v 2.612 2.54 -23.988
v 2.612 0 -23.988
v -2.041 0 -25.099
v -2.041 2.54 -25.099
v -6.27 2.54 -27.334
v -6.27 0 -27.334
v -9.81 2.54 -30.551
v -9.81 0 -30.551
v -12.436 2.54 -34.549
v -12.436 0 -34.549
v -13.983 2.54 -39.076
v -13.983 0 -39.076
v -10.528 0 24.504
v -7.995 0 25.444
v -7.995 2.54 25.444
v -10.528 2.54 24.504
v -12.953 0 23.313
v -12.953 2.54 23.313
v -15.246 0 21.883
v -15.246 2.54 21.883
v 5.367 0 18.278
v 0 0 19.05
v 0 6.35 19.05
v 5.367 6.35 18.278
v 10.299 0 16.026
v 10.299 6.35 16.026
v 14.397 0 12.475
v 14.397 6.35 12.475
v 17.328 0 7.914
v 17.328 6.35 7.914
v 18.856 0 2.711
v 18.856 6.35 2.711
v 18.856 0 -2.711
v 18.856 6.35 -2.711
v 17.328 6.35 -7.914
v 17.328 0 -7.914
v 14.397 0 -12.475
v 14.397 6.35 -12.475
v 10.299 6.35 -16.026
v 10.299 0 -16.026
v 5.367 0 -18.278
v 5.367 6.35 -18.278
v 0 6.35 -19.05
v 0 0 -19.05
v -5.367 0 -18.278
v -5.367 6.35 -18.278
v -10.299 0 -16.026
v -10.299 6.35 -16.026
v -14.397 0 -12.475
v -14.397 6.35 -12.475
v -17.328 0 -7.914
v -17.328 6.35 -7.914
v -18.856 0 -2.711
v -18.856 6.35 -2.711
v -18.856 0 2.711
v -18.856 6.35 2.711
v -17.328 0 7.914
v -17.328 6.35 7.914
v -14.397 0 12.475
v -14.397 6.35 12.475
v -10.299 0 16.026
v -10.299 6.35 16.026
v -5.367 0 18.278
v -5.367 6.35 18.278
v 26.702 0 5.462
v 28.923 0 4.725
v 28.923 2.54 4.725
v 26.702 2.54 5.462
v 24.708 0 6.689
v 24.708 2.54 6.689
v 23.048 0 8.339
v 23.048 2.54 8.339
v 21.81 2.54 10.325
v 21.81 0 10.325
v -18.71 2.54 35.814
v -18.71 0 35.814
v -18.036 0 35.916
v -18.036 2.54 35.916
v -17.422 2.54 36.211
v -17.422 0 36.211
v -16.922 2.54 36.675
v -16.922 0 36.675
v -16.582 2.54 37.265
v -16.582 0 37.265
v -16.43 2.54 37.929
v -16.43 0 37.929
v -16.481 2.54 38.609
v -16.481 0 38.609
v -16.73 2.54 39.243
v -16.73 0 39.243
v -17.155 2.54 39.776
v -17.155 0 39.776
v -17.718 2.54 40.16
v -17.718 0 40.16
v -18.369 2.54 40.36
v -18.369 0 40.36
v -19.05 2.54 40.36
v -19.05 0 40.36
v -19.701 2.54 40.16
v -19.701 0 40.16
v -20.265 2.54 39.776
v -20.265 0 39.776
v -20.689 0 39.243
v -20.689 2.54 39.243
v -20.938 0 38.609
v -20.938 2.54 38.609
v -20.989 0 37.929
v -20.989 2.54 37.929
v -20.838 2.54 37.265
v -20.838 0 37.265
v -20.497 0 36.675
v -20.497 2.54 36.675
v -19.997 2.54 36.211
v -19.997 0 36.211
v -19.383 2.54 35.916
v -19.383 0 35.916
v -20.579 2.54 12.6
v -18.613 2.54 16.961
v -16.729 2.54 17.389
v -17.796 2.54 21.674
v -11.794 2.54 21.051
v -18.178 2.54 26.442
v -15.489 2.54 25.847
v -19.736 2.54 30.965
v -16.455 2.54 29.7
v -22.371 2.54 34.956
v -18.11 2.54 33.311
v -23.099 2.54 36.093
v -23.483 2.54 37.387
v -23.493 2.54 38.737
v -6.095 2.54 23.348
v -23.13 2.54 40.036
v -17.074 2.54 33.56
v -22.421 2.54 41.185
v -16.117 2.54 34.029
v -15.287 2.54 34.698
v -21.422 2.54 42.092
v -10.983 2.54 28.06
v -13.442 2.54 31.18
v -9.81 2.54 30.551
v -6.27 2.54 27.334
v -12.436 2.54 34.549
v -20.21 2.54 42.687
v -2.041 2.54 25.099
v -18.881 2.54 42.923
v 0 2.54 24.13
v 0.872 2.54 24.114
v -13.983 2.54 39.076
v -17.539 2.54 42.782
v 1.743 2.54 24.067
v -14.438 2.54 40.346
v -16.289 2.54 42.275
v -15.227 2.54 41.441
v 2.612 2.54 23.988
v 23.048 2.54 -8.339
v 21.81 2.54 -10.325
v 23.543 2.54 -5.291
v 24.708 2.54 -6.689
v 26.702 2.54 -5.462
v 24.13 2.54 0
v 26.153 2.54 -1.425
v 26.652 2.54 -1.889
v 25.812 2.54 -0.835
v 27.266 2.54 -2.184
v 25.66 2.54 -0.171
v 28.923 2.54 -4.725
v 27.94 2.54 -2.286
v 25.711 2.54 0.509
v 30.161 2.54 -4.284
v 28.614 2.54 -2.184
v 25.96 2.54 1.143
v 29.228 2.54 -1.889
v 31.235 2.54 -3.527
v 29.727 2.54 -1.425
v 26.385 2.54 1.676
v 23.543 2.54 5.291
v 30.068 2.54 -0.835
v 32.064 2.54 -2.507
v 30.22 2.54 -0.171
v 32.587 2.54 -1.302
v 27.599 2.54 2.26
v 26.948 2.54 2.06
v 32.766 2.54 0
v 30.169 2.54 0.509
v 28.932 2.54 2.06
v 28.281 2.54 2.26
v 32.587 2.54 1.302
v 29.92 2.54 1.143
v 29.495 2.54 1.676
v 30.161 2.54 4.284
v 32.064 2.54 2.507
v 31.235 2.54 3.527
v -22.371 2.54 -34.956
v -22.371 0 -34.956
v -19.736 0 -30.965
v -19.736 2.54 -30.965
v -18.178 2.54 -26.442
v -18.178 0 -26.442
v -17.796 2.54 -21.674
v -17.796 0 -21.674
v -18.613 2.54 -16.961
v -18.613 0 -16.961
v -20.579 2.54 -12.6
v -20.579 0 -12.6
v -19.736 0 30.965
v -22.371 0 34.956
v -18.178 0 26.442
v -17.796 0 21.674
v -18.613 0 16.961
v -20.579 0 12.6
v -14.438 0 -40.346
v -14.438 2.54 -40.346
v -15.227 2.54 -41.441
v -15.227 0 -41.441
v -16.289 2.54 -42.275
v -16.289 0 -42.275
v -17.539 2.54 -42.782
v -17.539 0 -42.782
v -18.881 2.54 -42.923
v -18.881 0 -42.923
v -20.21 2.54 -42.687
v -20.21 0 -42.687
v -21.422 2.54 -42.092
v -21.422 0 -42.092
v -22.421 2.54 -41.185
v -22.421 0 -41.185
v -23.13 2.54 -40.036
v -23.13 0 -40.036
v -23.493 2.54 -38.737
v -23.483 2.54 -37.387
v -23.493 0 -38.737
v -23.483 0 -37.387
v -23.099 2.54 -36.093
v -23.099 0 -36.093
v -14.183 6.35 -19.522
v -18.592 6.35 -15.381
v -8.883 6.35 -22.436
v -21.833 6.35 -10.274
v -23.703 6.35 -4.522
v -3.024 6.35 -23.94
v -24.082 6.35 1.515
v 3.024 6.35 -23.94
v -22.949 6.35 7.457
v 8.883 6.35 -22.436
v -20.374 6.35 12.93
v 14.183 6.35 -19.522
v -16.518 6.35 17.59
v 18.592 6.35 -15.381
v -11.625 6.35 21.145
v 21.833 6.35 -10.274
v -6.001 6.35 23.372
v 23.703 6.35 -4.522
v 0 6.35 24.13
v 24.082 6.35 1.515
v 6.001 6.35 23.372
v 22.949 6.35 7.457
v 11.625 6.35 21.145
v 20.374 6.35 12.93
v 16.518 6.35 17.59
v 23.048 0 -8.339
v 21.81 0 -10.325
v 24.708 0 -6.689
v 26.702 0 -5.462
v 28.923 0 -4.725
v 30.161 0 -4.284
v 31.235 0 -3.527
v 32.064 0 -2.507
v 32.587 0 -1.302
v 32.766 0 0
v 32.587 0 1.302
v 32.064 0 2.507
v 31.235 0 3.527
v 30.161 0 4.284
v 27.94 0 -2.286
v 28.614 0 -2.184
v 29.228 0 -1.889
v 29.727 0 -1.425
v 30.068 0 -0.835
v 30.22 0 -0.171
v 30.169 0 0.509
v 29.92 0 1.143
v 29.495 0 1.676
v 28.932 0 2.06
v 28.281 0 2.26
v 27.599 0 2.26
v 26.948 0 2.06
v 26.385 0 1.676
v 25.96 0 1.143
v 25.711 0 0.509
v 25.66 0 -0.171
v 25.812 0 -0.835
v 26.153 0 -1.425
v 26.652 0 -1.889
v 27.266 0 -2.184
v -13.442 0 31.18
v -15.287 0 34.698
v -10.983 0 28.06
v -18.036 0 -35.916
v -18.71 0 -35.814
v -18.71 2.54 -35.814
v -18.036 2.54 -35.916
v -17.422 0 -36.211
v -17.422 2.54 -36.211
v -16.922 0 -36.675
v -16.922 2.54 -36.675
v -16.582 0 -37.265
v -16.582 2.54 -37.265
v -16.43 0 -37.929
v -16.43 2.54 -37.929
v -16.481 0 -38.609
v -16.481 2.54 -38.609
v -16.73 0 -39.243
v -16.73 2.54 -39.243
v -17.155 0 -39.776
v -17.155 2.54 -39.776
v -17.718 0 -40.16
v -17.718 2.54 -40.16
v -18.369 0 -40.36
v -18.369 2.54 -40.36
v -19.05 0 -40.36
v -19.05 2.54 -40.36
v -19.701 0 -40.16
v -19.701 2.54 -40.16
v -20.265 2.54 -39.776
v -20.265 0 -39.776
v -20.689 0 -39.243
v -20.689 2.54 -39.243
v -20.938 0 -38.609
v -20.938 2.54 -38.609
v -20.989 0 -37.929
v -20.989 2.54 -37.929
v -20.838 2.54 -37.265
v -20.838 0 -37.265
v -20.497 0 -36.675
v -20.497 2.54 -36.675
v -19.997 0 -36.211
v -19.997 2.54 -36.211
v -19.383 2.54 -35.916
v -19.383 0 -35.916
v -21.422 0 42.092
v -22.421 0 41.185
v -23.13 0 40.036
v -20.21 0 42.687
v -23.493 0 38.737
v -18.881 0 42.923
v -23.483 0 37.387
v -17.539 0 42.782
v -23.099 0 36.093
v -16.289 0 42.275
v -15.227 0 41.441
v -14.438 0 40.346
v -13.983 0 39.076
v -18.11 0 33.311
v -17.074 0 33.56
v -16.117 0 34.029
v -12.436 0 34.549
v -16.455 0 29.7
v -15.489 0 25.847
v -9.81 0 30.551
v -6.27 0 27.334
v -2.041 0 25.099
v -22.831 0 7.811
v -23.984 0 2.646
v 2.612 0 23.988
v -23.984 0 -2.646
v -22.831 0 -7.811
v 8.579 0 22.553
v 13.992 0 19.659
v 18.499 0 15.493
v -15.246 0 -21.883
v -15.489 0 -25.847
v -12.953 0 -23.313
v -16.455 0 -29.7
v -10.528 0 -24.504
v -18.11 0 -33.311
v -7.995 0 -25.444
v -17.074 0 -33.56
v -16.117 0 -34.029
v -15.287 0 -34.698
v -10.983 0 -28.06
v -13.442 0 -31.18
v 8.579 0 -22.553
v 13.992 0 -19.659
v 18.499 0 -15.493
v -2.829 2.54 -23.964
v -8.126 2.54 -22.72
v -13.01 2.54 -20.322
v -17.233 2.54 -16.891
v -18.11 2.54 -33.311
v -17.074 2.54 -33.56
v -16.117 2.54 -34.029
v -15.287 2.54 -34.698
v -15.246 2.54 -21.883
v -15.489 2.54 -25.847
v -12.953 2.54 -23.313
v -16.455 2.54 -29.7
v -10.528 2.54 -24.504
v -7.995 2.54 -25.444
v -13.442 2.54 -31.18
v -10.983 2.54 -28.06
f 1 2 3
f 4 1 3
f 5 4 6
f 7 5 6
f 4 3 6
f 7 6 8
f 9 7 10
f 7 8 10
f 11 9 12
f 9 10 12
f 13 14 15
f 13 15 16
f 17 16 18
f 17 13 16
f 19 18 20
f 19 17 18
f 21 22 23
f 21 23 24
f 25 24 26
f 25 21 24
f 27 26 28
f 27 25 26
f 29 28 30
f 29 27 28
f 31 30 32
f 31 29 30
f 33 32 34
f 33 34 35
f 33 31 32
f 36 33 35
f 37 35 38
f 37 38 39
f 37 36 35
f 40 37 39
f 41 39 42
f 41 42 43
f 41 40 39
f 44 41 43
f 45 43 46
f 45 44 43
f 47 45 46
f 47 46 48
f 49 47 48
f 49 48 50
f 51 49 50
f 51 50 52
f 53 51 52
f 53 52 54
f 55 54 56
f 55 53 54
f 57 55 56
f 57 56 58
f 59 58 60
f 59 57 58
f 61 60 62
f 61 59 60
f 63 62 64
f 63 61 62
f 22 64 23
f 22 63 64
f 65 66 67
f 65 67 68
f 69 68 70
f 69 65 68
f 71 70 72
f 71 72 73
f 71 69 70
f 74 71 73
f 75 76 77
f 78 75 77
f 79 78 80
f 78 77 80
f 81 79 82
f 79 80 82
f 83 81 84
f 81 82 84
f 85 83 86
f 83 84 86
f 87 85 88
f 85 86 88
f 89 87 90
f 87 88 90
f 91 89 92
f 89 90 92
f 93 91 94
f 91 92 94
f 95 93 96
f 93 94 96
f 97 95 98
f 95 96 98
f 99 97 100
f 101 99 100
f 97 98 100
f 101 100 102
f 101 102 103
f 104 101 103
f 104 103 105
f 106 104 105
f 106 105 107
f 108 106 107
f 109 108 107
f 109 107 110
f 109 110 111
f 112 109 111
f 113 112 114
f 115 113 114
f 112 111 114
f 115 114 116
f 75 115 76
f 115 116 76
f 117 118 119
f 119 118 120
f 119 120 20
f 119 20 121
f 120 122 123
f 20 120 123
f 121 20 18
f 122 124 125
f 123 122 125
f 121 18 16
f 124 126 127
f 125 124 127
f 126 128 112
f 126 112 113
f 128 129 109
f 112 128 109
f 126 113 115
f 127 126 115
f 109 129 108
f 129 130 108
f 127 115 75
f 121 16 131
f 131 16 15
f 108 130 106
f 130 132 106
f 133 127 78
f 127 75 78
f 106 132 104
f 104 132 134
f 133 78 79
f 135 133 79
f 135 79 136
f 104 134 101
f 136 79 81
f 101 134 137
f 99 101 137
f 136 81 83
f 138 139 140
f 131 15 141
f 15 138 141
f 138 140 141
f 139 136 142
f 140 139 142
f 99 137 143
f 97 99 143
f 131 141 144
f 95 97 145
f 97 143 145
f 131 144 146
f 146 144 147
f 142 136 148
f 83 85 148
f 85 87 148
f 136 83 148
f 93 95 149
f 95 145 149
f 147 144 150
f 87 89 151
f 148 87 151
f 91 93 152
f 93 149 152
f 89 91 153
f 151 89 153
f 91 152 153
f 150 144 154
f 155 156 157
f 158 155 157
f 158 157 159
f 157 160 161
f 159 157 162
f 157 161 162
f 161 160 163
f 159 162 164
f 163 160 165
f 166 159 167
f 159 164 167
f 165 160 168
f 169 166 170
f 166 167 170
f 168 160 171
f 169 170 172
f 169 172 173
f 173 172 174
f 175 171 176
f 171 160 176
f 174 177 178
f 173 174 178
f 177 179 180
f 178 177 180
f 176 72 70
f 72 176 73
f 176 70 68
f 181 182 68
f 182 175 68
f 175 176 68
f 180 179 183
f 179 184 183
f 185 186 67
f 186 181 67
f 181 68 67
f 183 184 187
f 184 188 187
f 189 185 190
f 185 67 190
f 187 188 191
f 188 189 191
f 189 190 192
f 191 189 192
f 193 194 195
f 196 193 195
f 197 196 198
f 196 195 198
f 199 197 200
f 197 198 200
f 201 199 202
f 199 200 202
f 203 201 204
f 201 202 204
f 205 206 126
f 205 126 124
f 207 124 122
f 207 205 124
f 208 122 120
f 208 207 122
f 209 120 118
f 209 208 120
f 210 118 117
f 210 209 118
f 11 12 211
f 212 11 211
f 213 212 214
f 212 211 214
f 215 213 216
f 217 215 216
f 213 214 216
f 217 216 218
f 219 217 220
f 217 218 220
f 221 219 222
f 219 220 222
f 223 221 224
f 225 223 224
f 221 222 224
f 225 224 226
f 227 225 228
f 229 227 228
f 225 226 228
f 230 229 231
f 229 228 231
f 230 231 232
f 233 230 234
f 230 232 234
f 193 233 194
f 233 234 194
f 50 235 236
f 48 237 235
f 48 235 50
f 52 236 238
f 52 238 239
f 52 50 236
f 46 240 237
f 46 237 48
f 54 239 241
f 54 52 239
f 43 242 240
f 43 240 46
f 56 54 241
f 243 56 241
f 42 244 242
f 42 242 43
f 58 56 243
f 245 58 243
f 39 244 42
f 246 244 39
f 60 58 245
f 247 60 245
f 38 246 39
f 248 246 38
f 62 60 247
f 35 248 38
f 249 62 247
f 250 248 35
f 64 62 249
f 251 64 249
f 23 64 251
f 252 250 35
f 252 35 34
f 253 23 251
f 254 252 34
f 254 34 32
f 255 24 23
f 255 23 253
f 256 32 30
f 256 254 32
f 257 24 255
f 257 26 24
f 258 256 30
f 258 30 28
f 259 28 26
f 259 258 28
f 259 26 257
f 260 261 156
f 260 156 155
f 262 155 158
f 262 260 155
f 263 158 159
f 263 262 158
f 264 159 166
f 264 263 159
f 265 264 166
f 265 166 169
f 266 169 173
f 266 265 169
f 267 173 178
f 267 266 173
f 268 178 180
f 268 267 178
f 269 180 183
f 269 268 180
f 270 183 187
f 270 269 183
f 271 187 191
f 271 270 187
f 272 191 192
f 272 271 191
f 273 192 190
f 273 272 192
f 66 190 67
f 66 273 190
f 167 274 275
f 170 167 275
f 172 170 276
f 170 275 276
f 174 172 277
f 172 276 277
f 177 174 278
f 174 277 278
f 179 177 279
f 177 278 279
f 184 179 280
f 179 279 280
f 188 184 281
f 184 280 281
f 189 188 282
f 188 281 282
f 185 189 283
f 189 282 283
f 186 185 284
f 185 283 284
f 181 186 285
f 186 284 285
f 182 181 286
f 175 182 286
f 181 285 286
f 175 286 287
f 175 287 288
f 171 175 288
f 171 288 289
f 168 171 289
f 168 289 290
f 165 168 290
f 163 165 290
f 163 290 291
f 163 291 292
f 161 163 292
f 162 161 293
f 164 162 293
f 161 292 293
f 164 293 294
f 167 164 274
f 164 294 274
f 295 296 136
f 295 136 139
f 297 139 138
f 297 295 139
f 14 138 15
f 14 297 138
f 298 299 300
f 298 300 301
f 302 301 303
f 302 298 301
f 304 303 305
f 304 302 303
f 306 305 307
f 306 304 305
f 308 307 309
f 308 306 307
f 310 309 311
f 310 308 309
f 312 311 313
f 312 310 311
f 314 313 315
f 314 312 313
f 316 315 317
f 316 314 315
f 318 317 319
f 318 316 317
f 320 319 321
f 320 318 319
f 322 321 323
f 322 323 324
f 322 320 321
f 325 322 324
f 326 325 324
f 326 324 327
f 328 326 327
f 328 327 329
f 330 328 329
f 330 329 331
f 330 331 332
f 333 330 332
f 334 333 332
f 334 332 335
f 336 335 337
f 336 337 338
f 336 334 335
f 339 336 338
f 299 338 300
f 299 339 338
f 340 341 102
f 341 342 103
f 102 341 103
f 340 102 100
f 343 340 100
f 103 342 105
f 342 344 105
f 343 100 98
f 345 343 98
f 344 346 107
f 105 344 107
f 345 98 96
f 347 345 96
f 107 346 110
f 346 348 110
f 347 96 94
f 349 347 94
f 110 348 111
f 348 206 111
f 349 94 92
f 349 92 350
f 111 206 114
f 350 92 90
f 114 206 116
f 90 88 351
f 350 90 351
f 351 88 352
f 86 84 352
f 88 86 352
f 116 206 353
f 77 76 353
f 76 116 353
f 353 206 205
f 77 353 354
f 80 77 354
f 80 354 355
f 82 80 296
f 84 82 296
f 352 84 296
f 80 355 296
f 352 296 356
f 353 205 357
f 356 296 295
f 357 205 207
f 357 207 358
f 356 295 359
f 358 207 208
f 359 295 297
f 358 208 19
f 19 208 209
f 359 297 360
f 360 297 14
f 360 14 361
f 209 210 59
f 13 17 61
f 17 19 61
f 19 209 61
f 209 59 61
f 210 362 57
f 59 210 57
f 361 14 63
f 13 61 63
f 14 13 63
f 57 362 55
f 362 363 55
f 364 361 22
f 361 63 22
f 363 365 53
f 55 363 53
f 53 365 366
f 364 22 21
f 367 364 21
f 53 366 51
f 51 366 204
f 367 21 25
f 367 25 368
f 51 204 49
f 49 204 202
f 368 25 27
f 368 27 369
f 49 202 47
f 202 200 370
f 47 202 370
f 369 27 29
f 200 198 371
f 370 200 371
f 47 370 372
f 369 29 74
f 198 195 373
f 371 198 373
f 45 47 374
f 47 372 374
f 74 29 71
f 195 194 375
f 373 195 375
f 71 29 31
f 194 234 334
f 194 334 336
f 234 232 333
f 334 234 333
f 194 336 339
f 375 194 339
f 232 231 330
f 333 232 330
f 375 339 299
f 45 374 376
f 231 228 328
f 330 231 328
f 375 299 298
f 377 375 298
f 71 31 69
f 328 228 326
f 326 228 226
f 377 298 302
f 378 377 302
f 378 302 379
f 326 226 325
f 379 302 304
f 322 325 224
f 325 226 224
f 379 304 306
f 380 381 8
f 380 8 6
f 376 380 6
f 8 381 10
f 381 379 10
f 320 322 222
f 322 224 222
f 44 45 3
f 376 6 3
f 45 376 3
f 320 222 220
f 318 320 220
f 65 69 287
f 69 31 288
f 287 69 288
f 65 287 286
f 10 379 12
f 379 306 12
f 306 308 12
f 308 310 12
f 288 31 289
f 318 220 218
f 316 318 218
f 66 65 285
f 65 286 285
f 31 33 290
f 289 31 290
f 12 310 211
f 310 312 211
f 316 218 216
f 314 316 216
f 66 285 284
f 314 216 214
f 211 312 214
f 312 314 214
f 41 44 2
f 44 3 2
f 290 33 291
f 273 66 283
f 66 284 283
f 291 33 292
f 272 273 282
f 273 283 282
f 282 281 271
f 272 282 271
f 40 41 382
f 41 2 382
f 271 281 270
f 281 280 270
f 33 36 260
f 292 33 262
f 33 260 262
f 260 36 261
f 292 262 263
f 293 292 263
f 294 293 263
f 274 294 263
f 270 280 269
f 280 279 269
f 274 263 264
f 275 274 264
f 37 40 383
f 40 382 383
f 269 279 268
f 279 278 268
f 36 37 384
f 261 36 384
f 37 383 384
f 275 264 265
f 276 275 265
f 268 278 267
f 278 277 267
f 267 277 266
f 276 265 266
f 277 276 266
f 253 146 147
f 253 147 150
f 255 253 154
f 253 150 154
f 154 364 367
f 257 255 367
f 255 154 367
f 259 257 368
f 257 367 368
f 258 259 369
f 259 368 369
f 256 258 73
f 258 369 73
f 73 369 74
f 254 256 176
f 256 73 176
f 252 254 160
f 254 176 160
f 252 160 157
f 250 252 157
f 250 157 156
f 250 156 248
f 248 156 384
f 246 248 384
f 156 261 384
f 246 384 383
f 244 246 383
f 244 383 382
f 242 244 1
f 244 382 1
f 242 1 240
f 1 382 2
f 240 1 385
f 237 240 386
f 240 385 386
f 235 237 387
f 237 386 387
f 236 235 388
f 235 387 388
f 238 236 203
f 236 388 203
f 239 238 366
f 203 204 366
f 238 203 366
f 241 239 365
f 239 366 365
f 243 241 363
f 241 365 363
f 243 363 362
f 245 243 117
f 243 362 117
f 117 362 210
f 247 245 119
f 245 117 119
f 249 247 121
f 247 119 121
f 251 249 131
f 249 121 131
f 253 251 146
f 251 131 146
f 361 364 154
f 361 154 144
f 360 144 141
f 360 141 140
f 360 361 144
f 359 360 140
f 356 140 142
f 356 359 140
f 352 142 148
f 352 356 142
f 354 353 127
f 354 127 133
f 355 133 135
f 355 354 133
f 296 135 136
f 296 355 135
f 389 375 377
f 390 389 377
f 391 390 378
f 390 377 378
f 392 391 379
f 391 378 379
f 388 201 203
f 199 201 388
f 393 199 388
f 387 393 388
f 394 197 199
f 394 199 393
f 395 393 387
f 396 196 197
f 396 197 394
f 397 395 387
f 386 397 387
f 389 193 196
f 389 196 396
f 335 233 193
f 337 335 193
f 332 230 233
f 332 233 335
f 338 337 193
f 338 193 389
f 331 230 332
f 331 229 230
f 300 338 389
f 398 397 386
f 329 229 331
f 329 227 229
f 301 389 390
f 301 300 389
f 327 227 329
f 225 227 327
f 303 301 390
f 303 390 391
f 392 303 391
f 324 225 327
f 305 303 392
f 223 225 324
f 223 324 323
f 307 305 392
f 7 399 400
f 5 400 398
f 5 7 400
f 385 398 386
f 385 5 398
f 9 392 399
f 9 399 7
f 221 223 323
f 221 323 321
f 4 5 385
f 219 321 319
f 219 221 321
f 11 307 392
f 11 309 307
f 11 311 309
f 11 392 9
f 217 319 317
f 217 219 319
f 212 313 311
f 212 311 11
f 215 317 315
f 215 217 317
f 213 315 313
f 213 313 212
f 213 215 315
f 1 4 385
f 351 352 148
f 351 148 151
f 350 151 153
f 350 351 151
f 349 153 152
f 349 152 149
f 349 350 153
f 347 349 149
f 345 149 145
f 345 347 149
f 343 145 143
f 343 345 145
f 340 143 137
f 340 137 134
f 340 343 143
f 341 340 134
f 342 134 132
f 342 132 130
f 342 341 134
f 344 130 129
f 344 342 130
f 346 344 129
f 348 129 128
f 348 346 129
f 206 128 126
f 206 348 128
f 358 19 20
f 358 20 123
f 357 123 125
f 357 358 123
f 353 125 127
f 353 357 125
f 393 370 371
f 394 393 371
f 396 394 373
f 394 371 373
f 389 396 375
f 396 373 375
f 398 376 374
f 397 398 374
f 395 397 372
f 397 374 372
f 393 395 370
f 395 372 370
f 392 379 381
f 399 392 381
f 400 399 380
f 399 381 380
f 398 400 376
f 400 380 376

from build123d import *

# Parameters (mm, degrees)
SKETCH1_R           = 24.13
SKETCH1_R_2         = 19.05
BOSS_EXTRUDE1_DEPTH = 6.35
SKETCH2_R           = 2.286
BOSS_EXTRUDE2_DEPTH = 2.54
SKETCH3_R           = 2.286
BOSS_EXTRUDE3_DEPTH = 2.54


with BuildPart() as part:
    # Sketch1 → Boss-Extrude1 (new body)
    with BuildSketch(Plane(origin=(0, 0, 0), x_dir=(1, 0, 0), z_dir=(0, 1, 0))):
        with Locations(Location((0, 0, 0), (0, 0, 270))):
            Circle(SKETCH1_R)
        with Locations(Location((0, 0, 0), (0, 0, 270))):
            Circle(SKETCH1_R_2, mode=Mode.SUBTRACT)
    extrude(amount=BOSS_EXTRUDE1_DEPTH)

    # Sketch2 → Boss-Extrude2 (add)
    with BuildSketch(Plane.XZ):
        with BuildLine():
            Line((21.809620202, 10.324600072), (21.809620202, -10.324600072))
            ThreePointArc((21.809620202, -10.324600072), (24.708155319, -6.688622381), (28.923046533, -4.724816982))
            ThreePointArc((28.923046533, -4.724816982), (32.766, 0), (28.923046533, 4.724816982))
            ThreePointArc((28.923046533, 4.724816982), (24.708155319, 6.688622381), (21.809620202, 10.324600072))
        make_face()
        with Locations(Location((27.94, 0, 0), (0, 0, 270))):
            Circle(SKETCH2_R, mode=Mode.SUBTRACT)
    extrude(amount=-BOSS_EXTRUDE2_DEPTH)

    # Sketch3 → Boss-Extrude3 (add)
    # profile 1 of 2: a face of its own
    with BuildSketch(Plane.XZ):
        with BuildLine():
            ThreePointArc((-18.110069721, 33.3113894), (-20.447664077, 33.59782849), (-22.371361767, 34.956424059))
            ThreePointArc((-22.371361767, 34.956424059), (-17.836458254, 24.069997968), (-20.578970769, 12.600113575))
            ThreePointArc((-20.578970769, 12.600113575), (-10.636194217, 21.659369164), (2.611644249, 23.988251589))
            ThreePointArc((2.611644249, 23.988251589), (-8.141414639, 28.83091072), (-13.983266974, 39.075537809))
            ThreePointArc((-13.983266974, 39.075537809), (-14.084369292, 36.722630449), (-15.286943189, 34.697732735))
            ThreePointArc((-15.286943189, 34.697732735), (-12.284263254, 29.563582193), (-7.99462004, 25.443564027))
            ThreePointArc((-7.99462004, 25.443564027), (-11.755793609, 23.93930276), (-15.245764429, 21.882768723))
            ThreePointArc((-15.245764429, 21.882768723), (-15.883236559, 27.796246369), (-18.110069721, 33.3113894))
        make_face()
    # profile 2 of 2: a face of its own
    with BuildSketch(Plane.XZ):
        with BuildLine():
            ThreePointArc((-22.371361767, 34.956424059), (-16.582401157, 33.768126167), (-13.983266974, 39.075537809))
            ThreePointArc((-13.983266974, 39.075537809), (-20.836878843, 42.431873833), (-22.371361767, 34.956424059))
        make_face()
        with Locations(Location((-18.70964, 38.1, 0), (0, 0, 270))):
            Circle(SKETCH3_R, mode=Mode.SUBTRACT)
    boss_extrude3 = extrude(amount=-BOSS_EXTRUDE3_DEPTH)

    # Mirror1: Boss-Extrude3 across plane
    add(boss_extrude3.mirror(Plane.XY))


solid = part.part
